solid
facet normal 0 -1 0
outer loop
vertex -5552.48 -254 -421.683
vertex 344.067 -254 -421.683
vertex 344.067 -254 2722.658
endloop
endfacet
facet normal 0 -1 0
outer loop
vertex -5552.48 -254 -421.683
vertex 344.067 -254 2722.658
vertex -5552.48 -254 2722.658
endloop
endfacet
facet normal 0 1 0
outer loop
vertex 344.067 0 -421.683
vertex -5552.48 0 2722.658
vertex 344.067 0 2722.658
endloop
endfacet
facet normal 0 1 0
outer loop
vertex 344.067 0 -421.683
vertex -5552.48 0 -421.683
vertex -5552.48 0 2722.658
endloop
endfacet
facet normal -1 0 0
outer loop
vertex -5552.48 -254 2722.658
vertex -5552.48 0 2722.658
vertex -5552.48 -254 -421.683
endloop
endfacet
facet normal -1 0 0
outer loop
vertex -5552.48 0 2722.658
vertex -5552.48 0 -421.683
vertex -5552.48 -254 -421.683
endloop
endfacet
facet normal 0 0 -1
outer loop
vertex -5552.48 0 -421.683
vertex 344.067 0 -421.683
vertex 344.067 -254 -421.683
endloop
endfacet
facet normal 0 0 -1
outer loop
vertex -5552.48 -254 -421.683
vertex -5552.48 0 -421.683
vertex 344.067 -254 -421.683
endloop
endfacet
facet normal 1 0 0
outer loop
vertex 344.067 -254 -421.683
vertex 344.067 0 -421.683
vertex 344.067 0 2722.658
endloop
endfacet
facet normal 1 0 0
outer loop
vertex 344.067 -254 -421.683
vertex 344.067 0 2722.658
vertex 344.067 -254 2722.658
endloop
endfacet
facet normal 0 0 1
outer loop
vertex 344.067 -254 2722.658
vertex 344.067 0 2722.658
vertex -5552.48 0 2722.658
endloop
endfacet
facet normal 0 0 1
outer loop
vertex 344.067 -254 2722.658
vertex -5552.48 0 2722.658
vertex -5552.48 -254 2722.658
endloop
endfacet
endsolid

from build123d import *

# Parameters (mm, degrees)
F0_W     = 105.3466051817
F0_H     = 96.3407531381
F1_DEPTH = 254
F2_DEPTH = 254
F3_DEPTH = 508
F4_W     = 254
F4_H     = 350.3407531381
F5_DEPTH = 762
F6_DEPTH = 254
F7_DEPTH = 584.2
F8_DEPTH = 3937
F9_DEPTH = 2540


with BuildPart() as f1:
    # F0 (on Front) → F1 (new body)
    with BuildSketch(Plane.XZ):
        with Locations((-216.6063860059, -119.512733072)):
            Rectangle(F0_W, F0_H)
    extrude(amount=F1_DEPTH)

    # F2 (add): a face of the model
    f2_faces = [f1.faces().sort_by_distance(p)[0] for p in [
        (-216.6063860059, -127, -71.342356503),
    ]]
    extrude(f2_faces, amount=F2_DEPTH)

    # F3 (add): a face of the model
    f3_faces = [f1.faces().sort_by_distance(p)[0] for p in [
        (-163.933083415, -127, 7.487266928),
    ]]
    extrude(f3_faces, amount=F3_DEPTH)

    # F4 (on face) → F5 (join)
    with BuildSketch(Plane(origin=(-269.2796885967, 0, 0), x_dir=(0, -1, 0), z_dir=(-1, 0, 0))):
        with Locations((127, 7.487266928)):
            Rectangle(F4_W, F4_H)
    extrude(amount=F5_DEPTH)

    # F6 (add): a face of the model
    f6_faces = [f1.faces().sort_by_distance(p)[0] for p in [
        (-343.6063860059, -127, -167.6831096411),
    ]]
    extrude(f6_faces, amount=F6_DEPTH)

    # F7 (add): a face of the model
    f7_faces = [f1.faces().sort_by_distance(p)[0] for p in [
        (-1031.2796885967, -127, -119.512733072),
    ]]
    extrude(f7_faces, amount=F7_DEPTH)

    # F8 (add): a face of the model
    f8_faces = [f1.faces().sort_by_distance(p)[0] for p in [
        (-1615.4796885967, -127, -119.512733072),
    ]]
    extrude(f8_faces, amount=F8_DEPTH)

    # F9 (add): a face of the model
    f9_faces = [f1.faces().sort_by_distance(p)[0] for p in [
        (-2604.2063860059, -127, 182.657643497),
    ]]
    extrude(f9_faces, amount=F9_DEPTH)


solid = f1.part
